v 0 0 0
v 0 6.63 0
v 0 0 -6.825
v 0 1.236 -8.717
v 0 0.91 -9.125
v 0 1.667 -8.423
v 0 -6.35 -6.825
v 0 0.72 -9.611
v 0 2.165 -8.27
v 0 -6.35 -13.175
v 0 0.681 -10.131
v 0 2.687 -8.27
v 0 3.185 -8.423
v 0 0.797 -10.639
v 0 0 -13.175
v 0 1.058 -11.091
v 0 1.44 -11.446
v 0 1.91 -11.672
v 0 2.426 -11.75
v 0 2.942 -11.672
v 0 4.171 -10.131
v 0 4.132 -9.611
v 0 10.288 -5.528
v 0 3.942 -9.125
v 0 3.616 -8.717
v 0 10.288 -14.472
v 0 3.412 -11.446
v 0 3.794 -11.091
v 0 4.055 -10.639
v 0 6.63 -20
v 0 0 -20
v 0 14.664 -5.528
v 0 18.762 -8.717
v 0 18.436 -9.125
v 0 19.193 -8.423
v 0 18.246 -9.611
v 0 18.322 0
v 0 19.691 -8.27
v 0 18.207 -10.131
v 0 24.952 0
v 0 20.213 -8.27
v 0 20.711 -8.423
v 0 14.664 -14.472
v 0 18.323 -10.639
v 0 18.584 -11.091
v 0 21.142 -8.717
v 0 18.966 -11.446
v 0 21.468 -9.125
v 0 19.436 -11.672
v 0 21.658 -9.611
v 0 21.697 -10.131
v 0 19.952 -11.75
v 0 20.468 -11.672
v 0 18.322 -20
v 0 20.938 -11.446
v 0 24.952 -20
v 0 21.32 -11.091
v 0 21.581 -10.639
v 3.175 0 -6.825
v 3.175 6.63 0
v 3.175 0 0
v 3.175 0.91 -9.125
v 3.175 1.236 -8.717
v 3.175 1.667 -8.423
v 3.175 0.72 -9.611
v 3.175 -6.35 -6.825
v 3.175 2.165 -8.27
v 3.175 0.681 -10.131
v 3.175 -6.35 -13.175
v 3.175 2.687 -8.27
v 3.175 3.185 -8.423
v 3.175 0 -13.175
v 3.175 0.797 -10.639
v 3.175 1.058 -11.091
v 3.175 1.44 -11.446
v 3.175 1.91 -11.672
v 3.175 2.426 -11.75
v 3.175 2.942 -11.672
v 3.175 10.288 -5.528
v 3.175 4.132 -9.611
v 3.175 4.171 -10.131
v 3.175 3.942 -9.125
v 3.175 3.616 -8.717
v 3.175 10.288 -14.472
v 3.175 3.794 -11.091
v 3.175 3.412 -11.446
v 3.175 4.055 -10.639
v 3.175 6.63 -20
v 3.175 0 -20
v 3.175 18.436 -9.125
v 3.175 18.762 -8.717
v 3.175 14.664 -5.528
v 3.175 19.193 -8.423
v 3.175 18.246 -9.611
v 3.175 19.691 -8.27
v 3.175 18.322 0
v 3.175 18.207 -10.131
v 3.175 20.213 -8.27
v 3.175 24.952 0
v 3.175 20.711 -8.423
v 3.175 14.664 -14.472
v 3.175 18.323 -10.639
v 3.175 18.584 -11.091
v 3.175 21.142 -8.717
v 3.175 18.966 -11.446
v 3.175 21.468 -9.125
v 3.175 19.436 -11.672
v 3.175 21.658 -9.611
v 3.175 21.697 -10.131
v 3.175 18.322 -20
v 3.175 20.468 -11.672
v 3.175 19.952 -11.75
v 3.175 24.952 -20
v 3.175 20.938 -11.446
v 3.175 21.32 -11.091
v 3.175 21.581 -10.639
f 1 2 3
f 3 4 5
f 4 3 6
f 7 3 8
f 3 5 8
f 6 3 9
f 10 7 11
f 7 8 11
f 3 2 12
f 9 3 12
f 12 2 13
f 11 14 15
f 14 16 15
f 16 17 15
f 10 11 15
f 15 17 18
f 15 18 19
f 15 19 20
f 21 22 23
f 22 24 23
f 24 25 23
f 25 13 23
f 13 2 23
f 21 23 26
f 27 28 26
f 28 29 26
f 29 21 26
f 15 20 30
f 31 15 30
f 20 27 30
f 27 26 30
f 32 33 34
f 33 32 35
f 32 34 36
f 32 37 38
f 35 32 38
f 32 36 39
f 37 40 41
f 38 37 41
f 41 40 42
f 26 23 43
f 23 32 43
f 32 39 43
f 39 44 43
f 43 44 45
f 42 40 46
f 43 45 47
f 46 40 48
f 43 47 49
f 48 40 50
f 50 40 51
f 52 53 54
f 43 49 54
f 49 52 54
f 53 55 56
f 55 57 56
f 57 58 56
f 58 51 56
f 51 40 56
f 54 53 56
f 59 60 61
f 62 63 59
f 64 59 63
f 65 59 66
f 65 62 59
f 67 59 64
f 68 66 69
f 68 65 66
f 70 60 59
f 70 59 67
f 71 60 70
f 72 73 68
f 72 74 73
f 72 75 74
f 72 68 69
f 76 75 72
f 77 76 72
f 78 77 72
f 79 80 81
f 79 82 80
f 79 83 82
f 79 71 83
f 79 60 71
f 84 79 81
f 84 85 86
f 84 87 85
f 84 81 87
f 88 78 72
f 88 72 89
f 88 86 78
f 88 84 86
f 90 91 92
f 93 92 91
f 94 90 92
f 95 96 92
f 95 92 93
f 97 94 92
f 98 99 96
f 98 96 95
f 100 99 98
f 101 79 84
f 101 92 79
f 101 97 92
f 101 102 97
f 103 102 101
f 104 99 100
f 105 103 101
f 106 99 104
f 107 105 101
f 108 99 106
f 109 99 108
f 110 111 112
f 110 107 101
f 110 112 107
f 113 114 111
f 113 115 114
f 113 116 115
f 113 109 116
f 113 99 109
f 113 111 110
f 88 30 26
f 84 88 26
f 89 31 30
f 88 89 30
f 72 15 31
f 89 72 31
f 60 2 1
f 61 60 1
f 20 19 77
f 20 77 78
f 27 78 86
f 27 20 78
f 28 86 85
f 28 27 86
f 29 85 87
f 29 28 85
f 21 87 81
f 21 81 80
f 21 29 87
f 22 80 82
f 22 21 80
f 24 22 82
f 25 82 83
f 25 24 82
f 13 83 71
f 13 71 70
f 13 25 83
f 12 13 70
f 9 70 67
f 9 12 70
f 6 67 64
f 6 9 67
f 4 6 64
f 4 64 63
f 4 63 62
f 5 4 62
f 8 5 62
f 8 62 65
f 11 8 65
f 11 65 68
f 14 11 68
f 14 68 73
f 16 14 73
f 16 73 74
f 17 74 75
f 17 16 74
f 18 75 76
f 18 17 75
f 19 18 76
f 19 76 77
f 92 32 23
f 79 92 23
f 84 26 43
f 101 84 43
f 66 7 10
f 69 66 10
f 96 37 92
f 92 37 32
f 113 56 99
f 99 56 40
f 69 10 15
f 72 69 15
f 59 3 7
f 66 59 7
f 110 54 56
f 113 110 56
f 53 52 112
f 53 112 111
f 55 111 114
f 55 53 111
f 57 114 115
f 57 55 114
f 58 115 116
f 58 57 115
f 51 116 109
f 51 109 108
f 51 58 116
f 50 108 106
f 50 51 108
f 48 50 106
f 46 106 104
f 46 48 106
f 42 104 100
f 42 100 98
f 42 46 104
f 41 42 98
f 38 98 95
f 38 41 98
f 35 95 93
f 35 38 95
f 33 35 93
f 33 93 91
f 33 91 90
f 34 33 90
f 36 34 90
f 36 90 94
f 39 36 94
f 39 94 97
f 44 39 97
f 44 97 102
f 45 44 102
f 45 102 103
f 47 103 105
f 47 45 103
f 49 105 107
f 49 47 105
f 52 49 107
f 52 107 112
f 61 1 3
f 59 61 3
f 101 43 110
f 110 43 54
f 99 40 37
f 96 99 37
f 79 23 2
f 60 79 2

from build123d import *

# Parameters (mm, degrees)
SKETCH1_R           = 1.75
BOSS_EXTRUDE1_DEPTH = 3.175


with BuildPart() as part:
    # Sketch1 → Boss-Extrude1 (new body)
    with BuildSketch(Plane(origin=(0, 0, 0), x_dir=(0, 0, -1), z_dir=(1, 0, 0))):
        Polygon((0, 0), (6.825, 0), (6.825, -6.35), (13.175, -6.35), (13.175, 0), (20, 0), (20, 6.629574014), (14.471500996, 10.288392178), (14.471500996, 14.663602622), (20, 18.322420786), (20, 24.9519948), (0, 24.9519948), (0, 18.322420786), (5.528499004, 14.663602622), (5.528499004, 10.288392178), (0, 6.629574014), align=None)
        with Locations((10, 19.9519948)):
            Circle(SKETCH1_R, mode=Mode.SUBTRACT)
        with Locations((10, 2.4259948)):
            Circle(SKETCH1_R, mode=Mode.SUBTRACT)
    extrude(amount=BOSS_EXTRUDE1_DEPTH)


solid = part.part
